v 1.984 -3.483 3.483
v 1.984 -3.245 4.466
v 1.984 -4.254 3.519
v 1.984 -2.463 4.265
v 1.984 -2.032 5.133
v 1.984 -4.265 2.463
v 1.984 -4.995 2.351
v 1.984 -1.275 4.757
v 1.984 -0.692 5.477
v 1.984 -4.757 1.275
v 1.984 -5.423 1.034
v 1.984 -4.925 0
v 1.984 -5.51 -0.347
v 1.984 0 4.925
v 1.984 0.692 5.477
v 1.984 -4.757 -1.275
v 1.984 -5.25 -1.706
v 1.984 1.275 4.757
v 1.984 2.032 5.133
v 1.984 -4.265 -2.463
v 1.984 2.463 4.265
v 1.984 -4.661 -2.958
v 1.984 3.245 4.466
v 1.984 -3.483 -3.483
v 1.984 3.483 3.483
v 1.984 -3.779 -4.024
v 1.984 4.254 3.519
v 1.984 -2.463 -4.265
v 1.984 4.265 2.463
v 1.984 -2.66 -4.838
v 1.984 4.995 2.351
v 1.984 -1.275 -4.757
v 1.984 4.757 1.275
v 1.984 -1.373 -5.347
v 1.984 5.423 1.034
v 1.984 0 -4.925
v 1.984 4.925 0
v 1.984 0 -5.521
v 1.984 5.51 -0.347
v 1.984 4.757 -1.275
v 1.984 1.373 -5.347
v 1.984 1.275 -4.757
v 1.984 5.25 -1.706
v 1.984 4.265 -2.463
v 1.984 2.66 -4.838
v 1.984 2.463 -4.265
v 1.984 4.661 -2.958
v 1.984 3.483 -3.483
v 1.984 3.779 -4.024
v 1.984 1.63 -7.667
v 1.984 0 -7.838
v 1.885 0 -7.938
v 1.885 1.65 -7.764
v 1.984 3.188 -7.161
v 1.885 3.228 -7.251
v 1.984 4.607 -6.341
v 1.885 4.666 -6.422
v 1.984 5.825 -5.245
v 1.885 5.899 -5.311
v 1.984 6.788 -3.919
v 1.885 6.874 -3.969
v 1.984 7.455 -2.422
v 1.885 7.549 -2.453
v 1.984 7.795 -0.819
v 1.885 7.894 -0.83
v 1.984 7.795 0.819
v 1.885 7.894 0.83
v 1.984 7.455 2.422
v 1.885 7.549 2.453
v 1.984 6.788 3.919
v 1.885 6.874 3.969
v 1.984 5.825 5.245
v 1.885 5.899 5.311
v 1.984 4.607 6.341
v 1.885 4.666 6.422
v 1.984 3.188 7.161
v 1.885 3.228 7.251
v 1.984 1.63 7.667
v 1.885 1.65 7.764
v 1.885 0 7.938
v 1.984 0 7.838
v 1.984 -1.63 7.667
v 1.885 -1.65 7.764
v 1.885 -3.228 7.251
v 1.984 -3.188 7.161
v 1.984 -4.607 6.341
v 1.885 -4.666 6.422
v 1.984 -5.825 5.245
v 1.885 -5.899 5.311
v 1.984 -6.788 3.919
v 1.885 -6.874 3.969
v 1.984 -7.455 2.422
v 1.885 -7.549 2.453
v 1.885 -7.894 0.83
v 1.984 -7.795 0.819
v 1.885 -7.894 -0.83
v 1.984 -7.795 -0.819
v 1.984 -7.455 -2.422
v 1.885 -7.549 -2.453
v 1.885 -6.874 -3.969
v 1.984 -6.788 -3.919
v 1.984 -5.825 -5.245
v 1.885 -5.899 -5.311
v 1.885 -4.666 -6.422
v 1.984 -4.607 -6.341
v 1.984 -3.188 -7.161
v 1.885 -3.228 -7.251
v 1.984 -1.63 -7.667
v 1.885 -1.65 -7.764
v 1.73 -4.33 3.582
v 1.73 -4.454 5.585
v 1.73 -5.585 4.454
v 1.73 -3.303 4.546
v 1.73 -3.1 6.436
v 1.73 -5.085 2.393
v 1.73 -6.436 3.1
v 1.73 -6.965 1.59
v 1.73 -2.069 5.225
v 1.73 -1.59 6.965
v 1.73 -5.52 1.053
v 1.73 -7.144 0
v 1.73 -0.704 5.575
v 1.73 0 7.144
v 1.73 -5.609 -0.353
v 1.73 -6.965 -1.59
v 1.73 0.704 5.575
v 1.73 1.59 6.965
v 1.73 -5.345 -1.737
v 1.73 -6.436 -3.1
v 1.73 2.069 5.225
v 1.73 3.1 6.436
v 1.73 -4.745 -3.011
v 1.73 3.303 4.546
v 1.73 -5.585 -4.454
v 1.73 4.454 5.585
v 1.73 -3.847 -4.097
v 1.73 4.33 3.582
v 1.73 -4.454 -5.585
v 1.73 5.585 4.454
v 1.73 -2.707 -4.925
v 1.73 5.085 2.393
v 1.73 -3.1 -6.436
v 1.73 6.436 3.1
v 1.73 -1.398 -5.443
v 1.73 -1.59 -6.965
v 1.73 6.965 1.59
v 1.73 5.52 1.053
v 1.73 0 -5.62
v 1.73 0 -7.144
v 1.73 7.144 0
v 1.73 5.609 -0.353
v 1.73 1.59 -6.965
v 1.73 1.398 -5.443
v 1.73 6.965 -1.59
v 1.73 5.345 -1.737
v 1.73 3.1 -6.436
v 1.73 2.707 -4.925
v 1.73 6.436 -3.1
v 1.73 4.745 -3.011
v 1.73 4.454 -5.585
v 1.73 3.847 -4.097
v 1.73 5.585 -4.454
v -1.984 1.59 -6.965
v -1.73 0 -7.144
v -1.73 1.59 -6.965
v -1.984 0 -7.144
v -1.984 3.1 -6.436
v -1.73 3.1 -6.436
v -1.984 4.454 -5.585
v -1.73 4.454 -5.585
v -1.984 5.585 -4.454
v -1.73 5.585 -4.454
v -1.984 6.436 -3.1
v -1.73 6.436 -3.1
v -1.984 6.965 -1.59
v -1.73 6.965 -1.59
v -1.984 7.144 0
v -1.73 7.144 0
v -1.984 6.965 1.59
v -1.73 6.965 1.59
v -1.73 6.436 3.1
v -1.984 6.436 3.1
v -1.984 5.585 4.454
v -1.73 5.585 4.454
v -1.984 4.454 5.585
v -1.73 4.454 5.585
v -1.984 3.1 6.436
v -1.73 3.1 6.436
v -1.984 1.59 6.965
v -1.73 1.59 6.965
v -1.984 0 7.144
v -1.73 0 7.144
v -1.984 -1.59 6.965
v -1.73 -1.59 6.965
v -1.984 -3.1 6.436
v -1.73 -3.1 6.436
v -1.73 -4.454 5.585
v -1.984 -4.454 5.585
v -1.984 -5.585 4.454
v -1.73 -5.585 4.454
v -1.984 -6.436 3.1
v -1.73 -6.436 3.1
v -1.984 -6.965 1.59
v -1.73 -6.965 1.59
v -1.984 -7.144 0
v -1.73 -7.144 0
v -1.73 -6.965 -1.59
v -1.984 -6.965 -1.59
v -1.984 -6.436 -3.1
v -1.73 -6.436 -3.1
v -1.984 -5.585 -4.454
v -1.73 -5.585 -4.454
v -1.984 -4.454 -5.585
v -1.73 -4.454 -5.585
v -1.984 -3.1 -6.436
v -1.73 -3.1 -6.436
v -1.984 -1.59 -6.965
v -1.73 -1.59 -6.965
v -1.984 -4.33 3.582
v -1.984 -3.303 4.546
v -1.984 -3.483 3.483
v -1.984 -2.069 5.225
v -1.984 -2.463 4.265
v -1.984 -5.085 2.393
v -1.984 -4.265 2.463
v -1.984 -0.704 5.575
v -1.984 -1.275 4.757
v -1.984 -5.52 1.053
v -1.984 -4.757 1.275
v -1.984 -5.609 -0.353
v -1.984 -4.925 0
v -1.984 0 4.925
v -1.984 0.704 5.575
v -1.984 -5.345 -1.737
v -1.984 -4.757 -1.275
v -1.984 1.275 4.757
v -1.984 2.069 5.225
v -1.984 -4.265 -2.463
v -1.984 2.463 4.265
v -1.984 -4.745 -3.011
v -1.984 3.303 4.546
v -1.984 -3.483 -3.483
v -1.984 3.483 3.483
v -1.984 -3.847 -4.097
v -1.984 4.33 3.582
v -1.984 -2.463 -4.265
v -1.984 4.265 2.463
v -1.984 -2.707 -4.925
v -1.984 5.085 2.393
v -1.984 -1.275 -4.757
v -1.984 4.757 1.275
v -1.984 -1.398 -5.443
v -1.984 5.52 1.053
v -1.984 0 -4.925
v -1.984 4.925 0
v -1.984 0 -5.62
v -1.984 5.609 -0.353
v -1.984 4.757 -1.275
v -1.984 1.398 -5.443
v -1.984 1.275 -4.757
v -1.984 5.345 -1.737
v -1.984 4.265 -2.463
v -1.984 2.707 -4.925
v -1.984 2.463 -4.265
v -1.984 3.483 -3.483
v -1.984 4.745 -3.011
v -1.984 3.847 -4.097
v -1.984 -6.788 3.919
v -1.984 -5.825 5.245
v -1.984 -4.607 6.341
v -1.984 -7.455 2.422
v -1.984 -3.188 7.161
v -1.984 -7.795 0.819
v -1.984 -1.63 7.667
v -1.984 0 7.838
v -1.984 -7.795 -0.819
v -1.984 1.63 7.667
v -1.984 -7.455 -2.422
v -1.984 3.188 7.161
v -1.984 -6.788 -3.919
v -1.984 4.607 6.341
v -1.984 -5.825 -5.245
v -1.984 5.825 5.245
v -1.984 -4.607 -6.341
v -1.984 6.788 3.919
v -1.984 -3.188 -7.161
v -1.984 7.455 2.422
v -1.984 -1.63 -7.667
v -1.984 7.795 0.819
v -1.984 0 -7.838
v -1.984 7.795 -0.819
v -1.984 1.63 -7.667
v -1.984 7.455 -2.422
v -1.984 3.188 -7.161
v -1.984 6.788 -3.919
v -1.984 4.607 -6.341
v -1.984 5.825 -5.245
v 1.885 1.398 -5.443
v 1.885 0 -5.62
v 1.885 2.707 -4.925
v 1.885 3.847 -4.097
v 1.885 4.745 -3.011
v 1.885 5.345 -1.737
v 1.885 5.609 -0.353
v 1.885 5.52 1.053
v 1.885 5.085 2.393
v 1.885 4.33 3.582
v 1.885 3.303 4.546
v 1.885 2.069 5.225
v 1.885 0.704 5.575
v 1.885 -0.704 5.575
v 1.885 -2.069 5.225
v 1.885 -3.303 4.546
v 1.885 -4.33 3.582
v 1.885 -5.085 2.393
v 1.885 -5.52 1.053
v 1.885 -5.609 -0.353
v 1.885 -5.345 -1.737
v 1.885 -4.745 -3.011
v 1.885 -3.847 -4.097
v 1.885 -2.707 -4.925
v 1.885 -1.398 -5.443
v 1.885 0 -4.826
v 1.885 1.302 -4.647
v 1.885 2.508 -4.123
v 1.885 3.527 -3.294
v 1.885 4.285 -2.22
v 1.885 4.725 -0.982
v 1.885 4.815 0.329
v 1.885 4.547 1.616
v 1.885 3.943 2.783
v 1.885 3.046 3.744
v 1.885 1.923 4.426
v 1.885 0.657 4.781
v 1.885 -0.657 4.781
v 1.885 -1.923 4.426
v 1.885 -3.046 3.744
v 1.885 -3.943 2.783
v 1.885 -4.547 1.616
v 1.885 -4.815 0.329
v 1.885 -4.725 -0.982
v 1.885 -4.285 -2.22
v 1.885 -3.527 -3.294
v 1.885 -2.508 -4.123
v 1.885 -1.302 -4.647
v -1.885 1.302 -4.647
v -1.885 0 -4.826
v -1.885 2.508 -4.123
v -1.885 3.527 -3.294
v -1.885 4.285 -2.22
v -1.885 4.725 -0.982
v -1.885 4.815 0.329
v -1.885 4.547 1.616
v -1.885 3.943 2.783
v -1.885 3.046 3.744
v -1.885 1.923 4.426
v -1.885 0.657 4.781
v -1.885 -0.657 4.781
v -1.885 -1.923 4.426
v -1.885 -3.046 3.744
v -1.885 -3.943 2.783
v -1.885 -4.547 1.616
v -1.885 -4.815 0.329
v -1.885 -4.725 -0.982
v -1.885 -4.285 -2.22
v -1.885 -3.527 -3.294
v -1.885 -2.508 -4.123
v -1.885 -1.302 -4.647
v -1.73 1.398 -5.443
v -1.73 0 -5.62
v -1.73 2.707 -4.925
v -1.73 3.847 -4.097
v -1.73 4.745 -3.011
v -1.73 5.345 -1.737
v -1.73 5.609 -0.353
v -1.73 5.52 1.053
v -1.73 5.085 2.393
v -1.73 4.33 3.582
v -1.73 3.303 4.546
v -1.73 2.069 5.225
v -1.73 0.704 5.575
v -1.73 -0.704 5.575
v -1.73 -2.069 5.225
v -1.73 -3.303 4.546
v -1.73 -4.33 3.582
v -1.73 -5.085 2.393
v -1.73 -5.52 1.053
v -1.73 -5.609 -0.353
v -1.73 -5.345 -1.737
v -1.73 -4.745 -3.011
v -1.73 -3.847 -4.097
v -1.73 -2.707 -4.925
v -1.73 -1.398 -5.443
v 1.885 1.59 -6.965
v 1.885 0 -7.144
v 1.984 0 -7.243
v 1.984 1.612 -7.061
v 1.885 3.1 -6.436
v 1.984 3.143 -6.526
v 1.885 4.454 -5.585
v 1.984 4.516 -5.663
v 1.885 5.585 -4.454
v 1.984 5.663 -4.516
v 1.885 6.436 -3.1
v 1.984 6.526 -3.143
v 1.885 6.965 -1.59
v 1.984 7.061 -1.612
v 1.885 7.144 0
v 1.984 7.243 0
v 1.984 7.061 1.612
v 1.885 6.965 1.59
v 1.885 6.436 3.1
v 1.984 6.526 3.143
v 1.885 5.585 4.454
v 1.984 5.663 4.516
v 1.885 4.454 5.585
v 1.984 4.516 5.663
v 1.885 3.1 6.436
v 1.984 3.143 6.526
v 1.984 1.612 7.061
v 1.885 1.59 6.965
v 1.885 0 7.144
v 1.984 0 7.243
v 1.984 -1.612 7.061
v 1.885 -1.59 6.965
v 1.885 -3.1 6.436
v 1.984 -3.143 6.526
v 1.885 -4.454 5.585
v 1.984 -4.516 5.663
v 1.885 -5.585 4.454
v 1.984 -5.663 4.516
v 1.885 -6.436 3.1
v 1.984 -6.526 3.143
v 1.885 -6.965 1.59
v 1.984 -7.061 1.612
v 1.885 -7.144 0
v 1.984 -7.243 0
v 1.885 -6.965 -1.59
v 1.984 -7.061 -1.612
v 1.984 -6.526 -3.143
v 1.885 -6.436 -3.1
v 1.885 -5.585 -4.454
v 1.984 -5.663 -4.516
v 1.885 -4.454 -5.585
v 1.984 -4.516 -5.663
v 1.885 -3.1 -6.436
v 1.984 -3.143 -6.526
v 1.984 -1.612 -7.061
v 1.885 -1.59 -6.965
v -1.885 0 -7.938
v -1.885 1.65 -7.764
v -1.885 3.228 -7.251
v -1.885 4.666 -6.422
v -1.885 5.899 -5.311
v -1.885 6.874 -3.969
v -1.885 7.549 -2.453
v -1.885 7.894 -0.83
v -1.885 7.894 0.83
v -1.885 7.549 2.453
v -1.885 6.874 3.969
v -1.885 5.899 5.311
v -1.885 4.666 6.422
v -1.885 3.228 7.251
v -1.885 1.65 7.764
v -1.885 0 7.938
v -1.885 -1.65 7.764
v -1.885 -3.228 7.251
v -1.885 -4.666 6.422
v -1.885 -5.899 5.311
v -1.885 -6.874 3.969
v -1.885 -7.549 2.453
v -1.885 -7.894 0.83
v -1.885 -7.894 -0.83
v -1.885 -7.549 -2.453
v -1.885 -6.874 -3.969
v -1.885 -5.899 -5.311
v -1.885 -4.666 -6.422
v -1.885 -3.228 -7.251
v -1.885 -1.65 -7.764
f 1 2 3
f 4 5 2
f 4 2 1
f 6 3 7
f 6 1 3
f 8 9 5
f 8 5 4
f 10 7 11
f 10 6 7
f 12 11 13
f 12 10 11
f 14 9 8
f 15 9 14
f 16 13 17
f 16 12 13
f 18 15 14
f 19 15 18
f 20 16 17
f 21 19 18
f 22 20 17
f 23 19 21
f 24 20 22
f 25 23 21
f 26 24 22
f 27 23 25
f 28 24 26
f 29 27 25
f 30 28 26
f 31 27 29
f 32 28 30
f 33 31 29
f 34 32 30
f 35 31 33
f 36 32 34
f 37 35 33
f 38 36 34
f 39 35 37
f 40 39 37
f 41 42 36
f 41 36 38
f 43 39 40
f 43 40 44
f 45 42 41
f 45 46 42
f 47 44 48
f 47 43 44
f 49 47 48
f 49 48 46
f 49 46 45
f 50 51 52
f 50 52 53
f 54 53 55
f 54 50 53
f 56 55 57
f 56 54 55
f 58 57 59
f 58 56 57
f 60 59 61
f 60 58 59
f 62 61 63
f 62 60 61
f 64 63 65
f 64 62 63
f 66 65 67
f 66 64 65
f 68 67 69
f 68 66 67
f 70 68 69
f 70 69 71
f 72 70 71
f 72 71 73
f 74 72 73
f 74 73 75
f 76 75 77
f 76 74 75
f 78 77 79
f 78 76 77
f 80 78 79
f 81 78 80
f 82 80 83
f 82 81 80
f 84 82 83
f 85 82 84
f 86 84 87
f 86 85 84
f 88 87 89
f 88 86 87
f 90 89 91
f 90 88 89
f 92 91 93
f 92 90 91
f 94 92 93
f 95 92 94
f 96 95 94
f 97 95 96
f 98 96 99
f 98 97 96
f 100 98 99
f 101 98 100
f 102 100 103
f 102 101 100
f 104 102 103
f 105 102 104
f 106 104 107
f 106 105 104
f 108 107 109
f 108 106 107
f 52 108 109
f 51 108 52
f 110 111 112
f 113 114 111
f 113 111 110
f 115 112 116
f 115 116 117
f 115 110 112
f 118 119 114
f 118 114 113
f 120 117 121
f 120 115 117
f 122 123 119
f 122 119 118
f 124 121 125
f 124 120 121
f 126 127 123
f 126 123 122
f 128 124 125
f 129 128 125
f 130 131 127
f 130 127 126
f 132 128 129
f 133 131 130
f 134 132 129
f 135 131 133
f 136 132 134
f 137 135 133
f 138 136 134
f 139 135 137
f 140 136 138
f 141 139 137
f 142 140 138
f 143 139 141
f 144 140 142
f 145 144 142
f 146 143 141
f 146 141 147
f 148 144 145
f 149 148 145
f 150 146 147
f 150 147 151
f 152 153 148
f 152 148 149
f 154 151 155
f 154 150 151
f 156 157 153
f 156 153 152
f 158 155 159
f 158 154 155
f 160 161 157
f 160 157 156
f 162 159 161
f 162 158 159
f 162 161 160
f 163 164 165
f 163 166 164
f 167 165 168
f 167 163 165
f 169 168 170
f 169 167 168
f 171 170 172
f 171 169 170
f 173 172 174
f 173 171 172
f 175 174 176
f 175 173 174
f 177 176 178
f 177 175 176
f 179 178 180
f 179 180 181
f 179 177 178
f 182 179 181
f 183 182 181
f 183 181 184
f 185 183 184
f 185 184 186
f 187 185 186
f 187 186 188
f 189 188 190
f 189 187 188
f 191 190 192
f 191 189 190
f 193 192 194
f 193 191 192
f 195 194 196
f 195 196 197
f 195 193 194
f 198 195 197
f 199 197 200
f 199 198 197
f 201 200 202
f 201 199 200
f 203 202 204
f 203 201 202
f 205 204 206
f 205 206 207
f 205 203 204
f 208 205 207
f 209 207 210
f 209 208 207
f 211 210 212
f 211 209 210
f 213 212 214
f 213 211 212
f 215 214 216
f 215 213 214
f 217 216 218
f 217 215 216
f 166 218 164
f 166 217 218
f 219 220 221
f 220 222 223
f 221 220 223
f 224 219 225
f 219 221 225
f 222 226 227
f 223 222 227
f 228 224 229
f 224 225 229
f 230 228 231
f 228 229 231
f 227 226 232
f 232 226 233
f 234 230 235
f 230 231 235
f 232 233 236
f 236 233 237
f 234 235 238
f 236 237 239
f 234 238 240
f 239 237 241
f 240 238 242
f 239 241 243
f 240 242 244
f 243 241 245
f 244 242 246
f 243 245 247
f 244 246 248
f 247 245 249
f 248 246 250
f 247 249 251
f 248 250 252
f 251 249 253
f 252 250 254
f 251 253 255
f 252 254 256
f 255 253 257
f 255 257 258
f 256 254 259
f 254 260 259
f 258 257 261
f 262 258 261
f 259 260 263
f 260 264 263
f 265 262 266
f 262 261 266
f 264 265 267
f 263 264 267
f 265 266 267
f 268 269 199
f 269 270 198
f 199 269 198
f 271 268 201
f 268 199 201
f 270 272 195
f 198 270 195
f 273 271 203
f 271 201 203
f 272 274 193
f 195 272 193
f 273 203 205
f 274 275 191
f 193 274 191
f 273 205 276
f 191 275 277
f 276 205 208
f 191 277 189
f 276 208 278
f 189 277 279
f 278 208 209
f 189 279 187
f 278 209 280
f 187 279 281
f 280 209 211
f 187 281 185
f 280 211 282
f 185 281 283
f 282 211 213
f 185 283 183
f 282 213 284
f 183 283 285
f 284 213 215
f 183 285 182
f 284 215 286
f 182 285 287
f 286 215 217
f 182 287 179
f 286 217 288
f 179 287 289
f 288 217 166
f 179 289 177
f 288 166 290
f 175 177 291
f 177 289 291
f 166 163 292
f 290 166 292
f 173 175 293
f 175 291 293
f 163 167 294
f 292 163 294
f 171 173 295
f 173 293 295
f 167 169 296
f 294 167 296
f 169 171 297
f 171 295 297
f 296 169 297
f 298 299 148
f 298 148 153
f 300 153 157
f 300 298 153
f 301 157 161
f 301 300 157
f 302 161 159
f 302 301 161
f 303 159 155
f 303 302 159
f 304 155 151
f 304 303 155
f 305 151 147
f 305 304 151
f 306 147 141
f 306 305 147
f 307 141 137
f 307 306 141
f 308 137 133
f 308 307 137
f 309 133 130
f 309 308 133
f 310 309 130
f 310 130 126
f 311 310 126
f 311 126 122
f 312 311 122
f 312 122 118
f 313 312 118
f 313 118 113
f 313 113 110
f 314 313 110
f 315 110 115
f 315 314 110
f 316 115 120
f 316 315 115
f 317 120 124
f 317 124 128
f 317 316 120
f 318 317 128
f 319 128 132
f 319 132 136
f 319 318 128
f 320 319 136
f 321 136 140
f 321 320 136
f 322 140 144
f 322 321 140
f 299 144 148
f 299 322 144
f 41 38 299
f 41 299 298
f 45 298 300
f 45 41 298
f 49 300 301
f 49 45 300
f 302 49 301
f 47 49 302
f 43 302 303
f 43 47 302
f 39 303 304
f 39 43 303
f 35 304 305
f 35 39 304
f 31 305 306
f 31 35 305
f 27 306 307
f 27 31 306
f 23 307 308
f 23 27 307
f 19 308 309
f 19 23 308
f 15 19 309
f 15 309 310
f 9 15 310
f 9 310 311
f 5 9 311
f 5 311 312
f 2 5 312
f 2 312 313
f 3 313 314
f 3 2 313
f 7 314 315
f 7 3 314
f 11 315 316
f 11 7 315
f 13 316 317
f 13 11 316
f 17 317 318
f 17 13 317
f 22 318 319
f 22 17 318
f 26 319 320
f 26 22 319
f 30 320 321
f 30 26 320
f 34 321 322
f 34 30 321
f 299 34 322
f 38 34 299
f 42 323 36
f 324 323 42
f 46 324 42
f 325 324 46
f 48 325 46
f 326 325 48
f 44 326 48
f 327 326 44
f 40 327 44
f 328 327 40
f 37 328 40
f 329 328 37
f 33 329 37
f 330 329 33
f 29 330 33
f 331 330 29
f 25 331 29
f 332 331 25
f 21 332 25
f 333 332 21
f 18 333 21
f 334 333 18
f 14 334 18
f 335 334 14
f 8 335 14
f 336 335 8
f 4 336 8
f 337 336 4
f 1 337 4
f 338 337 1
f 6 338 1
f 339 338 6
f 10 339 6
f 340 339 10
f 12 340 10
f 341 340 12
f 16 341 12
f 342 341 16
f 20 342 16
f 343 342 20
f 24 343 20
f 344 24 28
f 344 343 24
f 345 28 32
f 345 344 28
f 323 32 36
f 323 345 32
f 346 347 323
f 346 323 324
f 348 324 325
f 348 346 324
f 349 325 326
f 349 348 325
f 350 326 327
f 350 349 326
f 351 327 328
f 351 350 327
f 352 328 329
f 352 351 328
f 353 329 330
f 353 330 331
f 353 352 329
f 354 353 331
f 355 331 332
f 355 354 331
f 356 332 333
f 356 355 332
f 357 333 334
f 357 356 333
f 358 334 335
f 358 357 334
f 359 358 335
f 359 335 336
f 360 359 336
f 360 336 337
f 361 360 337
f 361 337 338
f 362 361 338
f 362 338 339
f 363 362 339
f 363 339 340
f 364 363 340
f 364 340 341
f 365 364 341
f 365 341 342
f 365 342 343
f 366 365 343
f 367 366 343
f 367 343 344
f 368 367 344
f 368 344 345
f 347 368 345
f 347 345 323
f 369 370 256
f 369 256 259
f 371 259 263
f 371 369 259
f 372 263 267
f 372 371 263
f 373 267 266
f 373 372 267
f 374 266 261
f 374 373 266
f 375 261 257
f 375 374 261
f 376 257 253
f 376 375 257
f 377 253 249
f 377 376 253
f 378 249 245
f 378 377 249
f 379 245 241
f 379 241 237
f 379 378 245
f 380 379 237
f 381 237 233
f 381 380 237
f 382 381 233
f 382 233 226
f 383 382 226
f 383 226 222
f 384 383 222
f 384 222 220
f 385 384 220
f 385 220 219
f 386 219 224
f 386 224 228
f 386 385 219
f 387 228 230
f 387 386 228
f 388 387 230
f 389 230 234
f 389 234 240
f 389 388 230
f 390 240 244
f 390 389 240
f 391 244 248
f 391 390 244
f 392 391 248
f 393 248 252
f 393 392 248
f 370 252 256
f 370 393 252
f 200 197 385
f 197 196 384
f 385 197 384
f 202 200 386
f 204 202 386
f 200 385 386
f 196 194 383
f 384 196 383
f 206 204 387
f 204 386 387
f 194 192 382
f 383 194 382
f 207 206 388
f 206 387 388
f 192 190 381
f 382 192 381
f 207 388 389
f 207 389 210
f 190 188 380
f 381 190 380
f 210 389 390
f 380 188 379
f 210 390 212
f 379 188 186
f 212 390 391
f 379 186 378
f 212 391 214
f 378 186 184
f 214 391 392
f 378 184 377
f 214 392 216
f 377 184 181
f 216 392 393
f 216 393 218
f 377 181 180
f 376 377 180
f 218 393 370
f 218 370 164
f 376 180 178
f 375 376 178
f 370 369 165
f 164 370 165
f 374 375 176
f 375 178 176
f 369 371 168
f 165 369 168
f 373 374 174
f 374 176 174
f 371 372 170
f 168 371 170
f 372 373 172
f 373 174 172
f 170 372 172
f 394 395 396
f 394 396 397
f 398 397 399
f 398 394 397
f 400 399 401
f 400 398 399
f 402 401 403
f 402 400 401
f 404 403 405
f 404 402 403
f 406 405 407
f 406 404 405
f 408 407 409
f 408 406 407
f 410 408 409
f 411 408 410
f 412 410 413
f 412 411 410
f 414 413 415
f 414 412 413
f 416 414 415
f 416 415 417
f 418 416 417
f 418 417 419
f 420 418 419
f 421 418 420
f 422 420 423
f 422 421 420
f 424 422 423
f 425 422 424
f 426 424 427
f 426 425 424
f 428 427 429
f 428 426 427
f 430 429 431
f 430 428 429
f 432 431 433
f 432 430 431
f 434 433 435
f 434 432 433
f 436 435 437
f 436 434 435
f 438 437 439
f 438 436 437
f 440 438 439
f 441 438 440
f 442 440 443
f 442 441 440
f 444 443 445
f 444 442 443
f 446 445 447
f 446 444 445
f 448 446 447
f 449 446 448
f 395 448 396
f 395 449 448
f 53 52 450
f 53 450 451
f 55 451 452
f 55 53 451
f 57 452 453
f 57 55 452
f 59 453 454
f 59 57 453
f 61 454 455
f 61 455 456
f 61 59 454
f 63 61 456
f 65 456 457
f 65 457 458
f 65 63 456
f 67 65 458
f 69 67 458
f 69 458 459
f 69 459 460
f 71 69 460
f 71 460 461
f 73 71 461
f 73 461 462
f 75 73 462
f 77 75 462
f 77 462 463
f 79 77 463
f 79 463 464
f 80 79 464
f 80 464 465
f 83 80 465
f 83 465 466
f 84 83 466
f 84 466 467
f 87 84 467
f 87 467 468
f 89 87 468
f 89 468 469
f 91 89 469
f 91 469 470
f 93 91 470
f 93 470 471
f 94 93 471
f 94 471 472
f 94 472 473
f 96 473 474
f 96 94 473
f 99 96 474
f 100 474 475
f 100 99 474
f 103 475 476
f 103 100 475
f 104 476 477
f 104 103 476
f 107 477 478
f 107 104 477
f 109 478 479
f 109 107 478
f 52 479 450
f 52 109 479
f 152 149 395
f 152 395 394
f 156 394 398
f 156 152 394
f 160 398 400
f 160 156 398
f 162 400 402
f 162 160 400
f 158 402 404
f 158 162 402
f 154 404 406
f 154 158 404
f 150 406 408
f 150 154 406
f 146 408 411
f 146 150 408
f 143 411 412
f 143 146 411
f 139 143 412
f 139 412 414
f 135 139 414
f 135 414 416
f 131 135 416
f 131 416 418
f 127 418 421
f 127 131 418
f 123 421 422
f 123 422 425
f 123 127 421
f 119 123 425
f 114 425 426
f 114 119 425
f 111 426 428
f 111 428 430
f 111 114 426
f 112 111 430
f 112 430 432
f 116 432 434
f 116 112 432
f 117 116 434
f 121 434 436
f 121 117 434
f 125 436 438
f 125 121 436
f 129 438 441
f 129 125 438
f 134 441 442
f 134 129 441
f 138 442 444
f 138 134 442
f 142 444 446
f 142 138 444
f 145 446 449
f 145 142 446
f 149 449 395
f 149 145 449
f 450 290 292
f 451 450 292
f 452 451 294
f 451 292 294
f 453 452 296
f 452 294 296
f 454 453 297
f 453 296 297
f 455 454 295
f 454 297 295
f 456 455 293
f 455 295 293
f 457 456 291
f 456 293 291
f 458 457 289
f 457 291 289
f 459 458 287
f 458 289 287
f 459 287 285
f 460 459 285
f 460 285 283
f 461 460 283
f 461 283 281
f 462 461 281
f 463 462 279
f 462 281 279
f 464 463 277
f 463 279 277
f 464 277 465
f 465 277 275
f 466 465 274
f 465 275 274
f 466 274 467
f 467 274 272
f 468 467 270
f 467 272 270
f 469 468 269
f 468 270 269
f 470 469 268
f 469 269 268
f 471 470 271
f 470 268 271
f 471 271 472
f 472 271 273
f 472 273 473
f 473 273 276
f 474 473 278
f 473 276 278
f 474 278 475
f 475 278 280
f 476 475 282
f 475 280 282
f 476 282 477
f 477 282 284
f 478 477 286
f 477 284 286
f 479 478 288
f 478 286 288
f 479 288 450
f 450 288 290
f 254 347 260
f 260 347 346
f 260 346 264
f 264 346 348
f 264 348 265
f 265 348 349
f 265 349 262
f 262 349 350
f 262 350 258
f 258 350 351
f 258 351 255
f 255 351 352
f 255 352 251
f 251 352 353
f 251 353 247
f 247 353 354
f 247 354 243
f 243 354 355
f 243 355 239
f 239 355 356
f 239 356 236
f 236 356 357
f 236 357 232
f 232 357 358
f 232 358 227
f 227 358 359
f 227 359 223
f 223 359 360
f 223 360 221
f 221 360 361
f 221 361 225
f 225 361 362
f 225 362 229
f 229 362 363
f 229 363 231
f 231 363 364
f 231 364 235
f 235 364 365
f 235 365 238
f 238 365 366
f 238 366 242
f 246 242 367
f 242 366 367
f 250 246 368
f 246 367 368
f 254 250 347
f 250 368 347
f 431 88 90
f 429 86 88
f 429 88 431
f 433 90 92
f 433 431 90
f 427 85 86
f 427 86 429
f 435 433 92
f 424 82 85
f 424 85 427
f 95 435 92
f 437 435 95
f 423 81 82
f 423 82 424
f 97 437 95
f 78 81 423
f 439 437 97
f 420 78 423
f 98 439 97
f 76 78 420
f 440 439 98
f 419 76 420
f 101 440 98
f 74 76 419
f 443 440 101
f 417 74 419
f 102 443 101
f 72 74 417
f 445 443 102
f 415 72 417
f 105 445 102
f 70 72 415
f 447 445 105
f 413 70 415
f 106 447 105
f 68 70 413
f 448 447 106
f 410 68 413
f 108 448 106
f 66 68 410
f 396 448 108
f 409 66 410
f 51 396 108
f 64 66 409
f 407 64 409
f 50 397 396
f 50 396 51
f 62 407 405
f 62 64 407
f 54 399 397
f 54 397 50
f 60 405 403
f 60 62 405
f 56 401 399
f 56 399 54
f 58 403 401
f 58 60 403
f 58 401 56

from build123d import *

# Parameters (mm, degrees)
SKETCH1_R             = 5.61975
SKETCH1_R_2           = 4.826
BOSS_EXTRUDE1_DEPTH   = 1.984375
SKETCH1_R_3           = 7.9375
SKETCH1_R_4           = 7.14375
BOSS_EXTRUDE1_2_DEPTH = 1.984375
SKETCH2_R             = 7.14375
SKETCH2_R_2           = 5.61975
BOSS_EXTRUDE2_DEPTH   = 1.730375
CHAMFER1_SIZE         = 0.09921875


with BuildPart() as part:
    # Sketch1 → Boss-Extrude1 (new, symmetric)
    with BuildSketch(Plane(origin=(0, 0, 0), x_dir=(0, 0, -1), z_dir=(1, 0, 0))):
        Circle(SKETCH1_R)
        Circle(SKETCH1_R_2, mode=Mode.SUBTRACT)
    extrude(amount=BOSS_EXTRUDE1_DEPTH, both=True)



with BuildPart() as body_2:
    # Sketch1 → Boss-Extrude1 2 (new, symmetric)
    with BuildSketch(Plane(origin=(0, 0, 0), x_dir=(0, 0, -1), z_dir=(1, 0, 0))):
        Circle(SKETCH1_R_3)
        Circle(SKETCH1_R_4, mode=Mode.SUBTRACT)
    extrude(amount=BOSS_EXTRUDE1_2_DEPTH, both=True)


with BuildPart() as part_1:
    add(part.part)

    add(body_2.part)  # Boss-Extrude2 merges body 2
    # Sketch2 → Boss-Extrude2 (add, symmetric)
    with BuildSketch(Plane(origin=(0, 0, 0), x_dir=(0, 0, -1), z_dir=(1, 0, 0))):
        Circle(SKETCH2_R)
        Circle(SKETCH2_R_2, mode=Mode.SUBTRACT)
    extrude(amount=BOSS_EXTRUDE2_DEPTH, both=True)

    # Chamfer1
    chamfer1_edges = [part_1.edges().sort_by_distance(p)[0] for p in [
        (1.984375, 0, 5.61975),
        (1.984375, 0, 7.14375),
        (-1.984375, 0, 7.9375),
        (1.984375, 0, 7.9375),
        (-1.984375, 0, 4.826),
        (1.984375, 0, 4.826),
    ]]
    chamfer(chamfer1_edges, length=CHAMFER1_SIZE)


solid = part_1.part
